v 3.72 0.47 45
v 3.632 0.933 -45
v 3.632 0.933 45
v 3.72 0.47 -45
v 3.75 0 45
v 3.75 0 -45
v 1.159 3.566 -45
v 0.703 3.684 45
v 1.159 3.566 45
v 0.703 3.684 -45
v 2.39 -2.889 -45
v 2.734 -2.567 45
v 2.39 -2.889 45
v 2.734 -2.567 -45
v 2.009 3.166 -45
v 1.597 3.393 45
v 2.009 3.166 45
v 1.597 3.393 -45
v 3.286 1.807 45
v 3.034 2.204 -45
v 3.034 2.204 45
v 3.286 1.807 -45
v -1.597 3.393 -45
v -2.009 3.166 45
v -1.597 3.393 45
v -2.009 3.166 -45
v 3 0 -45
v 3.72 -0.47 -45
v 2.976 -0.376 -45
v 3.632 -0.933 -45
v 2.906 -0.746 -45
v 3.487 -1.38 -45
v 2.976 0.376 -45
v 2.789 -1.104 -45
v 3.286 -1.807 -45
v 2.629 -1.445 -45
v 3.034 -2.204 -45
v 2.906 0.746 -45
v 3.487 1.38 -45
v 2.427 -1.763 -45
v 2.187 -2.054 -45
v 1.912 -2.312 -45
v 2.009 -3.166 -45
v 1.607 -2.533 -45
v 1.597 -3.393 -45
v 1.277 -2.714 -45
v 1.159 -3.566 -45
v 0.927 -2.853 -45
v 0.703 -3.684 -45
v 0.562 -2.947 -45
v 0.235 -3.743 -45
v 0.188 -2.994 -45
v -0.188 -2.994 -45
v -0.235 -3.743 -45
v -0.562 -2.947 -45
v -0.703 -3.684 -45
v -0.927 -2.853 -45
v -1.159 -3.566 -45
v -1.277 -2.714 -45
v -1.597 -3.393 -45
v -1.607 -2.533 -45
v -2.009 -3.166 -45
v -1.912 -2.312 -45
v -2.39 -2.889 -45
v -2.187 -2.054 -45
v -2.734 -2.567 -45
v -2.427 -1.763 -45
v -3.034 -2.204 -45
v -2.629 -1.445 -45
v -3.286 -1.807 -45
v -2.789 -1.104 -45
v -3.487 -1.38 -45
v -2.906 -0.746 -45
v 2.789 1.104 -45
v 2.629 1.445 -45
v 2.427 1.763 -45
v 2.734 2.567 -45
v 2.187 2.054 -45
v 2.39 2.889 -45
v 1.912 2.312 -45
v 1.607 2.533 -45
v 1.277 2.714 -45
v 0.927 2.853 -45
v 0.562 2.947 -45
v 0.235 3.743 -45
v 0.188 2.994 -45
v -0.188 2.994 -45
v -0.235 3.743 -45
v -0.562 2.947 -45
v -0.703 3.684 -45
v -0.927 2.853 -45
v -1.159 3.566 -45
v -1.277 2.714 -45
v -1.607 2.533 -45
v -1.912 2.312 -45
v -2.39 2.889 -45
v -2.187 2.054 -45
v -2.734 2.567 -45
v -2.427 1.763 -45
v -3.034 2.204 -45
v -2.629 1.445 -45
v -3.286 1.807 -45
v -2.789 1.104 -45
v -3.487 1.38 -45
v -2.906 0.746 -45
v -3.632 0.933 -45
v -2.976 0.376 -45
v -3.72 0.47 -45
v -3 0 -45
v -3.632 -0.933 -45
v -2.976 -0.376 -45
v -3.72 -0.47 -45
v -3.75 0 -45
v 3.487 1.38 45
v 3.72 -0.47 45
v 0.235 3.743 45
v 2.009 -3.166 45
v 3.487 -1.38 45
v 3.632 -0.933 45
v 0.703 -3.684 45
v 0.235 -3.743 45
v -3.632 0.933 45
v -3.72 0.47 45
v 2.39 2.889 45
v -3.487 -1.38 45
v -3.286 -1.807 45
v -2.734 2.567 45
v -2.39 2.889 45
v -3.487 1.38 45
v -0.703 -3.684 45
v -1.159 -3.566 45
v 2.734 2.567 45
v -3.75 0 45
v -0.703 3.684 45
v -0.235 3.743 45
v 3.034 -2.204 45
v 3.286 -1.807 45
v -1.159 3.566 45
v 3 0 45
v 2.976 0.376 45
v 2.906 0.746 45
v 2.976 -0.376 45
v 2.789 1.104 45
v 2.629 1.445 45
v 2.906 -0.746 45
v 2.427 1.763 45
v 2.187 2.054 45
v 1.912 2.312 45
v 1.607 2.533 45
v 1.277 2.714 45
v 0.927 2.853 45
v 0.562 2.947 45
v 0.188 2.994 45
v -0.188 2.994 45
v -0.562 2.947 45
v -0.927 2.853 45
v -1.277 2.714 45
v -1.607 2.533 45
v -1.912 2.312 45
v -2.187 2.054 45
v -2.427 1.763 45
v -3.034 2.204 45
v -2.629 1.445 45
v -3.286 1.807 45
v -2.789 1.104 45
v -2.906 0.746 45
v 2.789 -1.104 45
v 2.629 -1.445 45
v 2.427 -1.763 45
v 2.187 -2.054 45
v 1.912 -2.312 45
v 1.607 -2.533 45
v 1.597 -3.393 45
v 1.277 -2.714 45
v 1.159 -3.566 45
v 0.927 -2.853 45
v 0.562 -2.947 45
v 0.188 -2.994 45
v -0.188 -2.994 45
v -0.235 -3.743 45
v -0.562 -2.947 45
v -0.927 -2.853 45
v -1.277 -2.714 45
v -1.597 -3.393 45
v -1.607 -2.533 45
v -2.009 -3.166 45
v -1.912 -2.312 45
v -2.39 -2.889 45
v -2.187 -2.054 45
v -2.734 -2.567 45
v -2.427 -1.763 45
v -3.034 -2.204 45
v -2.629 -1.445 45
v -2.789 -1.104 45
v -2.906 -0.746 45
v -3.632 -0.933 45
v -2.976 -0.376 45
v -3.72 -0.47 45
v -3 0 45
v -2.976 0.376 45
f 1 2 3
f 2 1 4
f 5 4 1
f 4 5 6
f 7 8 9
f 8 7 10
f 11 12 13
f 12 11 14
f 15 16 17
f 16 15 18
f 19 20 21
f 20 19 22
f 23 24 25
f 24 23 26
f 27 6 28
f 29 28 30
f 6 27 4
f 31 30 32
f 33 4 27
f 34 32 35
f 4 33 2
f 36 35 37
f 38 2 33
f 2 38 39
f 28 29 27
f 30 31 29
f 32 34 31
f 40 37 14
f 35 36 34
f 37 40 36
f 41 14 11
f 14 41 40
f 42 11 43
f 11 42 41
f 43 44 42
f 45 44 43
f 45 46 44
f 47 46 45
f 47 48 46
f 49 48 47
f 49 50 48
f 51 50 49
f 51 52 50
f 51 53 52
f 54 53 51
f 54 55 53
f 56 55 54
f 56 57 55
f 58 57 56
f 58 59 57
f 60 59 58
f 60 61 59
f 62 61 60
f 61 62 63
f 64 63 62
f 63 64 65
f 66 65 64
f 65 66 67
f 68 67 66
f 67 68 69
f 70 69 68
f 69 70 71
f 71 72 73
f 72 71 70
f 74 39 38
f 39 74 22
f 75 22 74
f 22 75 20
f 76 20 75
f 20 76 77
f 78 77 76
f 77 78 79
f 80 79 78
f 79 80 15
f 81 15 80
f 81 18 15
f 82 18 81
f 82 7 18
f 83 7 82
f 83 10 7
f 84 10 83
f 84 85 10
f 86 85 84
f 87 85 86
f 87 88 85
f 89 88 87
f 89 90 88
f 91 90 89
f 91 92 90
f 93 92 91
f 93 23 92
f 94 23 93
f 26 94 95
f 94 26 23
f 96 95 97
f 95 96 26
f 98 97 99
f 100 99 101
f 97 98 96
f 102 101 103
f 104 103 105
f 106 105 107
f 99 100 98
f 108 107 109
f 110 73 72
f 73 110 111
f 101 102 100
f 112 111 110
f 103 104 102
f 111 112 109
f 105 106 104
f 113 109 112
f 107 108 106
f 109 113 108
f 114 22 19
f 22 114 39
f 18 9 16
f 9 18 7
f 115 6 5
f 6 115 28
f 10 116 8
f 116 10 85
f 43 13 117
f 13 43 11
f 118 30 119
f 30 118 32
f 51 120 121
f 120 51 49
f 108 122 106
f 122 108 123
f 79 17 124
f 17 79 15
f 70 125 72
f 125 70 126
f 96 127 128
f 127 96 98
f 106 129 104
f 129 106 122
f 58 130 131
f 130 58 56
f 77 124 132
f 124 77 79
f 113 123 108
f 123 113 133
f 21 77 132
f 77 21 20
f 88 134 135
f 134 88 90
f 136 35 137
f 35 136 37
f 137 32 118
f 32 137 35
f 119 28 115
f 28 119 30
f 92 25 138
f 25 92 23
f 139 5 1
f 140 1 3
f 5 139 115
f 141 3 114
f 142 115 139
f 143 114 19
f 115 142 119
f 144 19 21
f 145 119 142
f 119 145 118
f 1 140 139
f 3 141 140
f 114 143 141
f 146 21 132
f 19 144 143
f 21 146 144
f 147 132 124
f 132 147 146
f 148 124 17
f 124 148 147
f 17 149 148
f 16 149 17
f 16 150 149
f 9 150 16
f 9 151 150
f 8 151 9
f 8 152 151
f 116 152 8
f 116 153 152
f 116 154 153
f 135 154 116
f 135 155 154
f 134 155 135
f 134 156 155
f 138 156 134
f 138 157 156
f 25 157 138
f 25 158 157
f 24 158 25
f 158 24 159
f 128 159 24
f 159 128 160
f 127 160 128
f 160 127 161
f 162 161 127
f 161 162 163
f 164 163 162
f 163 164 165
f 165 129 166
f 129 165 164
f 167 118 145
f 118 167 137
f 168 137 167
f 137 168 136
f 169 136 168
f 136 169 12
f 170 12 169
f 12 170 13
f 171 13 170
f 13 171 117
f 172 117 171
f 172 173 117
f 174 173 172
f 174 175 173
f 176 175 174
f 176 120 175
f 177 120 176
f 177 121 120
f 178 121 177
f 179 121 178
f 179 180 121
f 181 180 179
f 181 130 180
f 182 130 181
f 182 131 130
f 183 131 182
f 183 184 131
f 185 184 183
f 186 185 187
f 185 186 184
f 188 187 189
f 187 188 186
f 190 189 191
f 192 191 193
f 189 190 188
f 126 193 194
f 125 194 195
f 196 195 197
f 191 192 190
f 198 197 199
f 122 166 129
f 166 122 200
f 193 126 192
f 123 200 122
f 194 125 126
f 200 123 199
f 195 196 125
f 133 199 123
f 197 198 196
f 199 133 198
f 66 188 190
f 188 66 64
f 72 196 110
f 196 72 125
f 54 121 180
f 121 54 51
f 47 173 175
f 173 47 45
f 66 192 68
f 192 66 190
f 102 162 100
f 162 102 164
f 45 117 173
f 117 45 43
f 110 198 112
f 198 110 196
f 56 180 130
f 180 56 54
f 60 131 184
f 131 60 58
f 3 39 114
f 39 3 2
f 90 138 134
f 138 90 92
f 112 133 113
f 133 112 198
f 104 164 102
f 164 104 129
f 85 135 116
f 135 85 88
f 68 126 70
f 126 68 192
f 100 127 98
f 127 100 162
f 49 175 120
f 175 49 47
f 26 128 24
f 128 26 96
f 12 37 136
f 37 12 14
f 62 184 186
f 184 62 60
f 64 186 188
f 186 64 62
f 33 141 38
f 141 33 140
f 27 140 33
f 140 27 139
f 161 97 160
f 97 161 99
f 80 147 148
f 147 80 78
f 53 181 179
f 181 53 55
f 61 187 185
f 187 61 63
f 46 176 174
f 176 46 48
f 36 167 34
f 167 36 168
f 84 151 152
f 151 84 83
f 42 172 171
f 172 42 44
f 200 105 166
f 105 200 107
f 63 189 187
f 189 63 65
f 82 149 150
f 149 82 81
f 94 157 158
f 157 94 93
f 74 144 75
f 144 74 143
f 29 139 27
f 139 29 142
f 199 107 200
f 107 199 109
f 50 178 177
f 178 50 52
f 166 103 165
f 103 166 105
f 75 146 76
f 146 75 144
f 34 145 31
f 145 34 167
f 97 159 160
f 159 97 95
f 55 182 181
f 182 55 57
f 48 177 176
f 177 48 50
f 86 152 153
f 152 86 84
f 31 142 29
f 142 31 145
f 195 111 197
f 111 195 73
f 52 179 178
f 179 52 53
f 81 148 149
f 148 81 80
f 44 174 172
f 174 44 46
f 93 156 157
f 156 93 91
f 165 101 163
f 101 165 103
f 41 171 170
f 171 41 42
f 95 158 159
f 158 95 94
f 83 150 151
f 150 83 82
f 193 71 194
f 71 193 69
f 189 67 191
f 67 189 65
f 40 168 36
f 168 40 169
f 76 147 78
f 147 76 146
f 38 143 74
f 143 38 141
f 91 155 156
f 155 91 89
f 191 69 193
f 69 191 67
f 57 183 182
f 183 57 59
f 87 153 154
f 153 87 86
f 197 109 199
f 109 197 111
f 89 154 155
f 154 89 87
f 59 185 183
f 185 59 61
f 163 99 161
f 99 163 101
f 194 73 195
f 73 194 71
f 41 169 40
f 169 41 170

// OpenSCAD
$fn = 50;


difference() {
	union() {
		translate(v = [0, 0, -45.0000000000]) {
			cylinder(h = 90, r = 3.7500000000);
		}
	}
	union() {
		translate(v = [0, 0, -100.0000000000]) {
			cylinder(h = 200, r = 3.0000000000);
		}
	}
}
